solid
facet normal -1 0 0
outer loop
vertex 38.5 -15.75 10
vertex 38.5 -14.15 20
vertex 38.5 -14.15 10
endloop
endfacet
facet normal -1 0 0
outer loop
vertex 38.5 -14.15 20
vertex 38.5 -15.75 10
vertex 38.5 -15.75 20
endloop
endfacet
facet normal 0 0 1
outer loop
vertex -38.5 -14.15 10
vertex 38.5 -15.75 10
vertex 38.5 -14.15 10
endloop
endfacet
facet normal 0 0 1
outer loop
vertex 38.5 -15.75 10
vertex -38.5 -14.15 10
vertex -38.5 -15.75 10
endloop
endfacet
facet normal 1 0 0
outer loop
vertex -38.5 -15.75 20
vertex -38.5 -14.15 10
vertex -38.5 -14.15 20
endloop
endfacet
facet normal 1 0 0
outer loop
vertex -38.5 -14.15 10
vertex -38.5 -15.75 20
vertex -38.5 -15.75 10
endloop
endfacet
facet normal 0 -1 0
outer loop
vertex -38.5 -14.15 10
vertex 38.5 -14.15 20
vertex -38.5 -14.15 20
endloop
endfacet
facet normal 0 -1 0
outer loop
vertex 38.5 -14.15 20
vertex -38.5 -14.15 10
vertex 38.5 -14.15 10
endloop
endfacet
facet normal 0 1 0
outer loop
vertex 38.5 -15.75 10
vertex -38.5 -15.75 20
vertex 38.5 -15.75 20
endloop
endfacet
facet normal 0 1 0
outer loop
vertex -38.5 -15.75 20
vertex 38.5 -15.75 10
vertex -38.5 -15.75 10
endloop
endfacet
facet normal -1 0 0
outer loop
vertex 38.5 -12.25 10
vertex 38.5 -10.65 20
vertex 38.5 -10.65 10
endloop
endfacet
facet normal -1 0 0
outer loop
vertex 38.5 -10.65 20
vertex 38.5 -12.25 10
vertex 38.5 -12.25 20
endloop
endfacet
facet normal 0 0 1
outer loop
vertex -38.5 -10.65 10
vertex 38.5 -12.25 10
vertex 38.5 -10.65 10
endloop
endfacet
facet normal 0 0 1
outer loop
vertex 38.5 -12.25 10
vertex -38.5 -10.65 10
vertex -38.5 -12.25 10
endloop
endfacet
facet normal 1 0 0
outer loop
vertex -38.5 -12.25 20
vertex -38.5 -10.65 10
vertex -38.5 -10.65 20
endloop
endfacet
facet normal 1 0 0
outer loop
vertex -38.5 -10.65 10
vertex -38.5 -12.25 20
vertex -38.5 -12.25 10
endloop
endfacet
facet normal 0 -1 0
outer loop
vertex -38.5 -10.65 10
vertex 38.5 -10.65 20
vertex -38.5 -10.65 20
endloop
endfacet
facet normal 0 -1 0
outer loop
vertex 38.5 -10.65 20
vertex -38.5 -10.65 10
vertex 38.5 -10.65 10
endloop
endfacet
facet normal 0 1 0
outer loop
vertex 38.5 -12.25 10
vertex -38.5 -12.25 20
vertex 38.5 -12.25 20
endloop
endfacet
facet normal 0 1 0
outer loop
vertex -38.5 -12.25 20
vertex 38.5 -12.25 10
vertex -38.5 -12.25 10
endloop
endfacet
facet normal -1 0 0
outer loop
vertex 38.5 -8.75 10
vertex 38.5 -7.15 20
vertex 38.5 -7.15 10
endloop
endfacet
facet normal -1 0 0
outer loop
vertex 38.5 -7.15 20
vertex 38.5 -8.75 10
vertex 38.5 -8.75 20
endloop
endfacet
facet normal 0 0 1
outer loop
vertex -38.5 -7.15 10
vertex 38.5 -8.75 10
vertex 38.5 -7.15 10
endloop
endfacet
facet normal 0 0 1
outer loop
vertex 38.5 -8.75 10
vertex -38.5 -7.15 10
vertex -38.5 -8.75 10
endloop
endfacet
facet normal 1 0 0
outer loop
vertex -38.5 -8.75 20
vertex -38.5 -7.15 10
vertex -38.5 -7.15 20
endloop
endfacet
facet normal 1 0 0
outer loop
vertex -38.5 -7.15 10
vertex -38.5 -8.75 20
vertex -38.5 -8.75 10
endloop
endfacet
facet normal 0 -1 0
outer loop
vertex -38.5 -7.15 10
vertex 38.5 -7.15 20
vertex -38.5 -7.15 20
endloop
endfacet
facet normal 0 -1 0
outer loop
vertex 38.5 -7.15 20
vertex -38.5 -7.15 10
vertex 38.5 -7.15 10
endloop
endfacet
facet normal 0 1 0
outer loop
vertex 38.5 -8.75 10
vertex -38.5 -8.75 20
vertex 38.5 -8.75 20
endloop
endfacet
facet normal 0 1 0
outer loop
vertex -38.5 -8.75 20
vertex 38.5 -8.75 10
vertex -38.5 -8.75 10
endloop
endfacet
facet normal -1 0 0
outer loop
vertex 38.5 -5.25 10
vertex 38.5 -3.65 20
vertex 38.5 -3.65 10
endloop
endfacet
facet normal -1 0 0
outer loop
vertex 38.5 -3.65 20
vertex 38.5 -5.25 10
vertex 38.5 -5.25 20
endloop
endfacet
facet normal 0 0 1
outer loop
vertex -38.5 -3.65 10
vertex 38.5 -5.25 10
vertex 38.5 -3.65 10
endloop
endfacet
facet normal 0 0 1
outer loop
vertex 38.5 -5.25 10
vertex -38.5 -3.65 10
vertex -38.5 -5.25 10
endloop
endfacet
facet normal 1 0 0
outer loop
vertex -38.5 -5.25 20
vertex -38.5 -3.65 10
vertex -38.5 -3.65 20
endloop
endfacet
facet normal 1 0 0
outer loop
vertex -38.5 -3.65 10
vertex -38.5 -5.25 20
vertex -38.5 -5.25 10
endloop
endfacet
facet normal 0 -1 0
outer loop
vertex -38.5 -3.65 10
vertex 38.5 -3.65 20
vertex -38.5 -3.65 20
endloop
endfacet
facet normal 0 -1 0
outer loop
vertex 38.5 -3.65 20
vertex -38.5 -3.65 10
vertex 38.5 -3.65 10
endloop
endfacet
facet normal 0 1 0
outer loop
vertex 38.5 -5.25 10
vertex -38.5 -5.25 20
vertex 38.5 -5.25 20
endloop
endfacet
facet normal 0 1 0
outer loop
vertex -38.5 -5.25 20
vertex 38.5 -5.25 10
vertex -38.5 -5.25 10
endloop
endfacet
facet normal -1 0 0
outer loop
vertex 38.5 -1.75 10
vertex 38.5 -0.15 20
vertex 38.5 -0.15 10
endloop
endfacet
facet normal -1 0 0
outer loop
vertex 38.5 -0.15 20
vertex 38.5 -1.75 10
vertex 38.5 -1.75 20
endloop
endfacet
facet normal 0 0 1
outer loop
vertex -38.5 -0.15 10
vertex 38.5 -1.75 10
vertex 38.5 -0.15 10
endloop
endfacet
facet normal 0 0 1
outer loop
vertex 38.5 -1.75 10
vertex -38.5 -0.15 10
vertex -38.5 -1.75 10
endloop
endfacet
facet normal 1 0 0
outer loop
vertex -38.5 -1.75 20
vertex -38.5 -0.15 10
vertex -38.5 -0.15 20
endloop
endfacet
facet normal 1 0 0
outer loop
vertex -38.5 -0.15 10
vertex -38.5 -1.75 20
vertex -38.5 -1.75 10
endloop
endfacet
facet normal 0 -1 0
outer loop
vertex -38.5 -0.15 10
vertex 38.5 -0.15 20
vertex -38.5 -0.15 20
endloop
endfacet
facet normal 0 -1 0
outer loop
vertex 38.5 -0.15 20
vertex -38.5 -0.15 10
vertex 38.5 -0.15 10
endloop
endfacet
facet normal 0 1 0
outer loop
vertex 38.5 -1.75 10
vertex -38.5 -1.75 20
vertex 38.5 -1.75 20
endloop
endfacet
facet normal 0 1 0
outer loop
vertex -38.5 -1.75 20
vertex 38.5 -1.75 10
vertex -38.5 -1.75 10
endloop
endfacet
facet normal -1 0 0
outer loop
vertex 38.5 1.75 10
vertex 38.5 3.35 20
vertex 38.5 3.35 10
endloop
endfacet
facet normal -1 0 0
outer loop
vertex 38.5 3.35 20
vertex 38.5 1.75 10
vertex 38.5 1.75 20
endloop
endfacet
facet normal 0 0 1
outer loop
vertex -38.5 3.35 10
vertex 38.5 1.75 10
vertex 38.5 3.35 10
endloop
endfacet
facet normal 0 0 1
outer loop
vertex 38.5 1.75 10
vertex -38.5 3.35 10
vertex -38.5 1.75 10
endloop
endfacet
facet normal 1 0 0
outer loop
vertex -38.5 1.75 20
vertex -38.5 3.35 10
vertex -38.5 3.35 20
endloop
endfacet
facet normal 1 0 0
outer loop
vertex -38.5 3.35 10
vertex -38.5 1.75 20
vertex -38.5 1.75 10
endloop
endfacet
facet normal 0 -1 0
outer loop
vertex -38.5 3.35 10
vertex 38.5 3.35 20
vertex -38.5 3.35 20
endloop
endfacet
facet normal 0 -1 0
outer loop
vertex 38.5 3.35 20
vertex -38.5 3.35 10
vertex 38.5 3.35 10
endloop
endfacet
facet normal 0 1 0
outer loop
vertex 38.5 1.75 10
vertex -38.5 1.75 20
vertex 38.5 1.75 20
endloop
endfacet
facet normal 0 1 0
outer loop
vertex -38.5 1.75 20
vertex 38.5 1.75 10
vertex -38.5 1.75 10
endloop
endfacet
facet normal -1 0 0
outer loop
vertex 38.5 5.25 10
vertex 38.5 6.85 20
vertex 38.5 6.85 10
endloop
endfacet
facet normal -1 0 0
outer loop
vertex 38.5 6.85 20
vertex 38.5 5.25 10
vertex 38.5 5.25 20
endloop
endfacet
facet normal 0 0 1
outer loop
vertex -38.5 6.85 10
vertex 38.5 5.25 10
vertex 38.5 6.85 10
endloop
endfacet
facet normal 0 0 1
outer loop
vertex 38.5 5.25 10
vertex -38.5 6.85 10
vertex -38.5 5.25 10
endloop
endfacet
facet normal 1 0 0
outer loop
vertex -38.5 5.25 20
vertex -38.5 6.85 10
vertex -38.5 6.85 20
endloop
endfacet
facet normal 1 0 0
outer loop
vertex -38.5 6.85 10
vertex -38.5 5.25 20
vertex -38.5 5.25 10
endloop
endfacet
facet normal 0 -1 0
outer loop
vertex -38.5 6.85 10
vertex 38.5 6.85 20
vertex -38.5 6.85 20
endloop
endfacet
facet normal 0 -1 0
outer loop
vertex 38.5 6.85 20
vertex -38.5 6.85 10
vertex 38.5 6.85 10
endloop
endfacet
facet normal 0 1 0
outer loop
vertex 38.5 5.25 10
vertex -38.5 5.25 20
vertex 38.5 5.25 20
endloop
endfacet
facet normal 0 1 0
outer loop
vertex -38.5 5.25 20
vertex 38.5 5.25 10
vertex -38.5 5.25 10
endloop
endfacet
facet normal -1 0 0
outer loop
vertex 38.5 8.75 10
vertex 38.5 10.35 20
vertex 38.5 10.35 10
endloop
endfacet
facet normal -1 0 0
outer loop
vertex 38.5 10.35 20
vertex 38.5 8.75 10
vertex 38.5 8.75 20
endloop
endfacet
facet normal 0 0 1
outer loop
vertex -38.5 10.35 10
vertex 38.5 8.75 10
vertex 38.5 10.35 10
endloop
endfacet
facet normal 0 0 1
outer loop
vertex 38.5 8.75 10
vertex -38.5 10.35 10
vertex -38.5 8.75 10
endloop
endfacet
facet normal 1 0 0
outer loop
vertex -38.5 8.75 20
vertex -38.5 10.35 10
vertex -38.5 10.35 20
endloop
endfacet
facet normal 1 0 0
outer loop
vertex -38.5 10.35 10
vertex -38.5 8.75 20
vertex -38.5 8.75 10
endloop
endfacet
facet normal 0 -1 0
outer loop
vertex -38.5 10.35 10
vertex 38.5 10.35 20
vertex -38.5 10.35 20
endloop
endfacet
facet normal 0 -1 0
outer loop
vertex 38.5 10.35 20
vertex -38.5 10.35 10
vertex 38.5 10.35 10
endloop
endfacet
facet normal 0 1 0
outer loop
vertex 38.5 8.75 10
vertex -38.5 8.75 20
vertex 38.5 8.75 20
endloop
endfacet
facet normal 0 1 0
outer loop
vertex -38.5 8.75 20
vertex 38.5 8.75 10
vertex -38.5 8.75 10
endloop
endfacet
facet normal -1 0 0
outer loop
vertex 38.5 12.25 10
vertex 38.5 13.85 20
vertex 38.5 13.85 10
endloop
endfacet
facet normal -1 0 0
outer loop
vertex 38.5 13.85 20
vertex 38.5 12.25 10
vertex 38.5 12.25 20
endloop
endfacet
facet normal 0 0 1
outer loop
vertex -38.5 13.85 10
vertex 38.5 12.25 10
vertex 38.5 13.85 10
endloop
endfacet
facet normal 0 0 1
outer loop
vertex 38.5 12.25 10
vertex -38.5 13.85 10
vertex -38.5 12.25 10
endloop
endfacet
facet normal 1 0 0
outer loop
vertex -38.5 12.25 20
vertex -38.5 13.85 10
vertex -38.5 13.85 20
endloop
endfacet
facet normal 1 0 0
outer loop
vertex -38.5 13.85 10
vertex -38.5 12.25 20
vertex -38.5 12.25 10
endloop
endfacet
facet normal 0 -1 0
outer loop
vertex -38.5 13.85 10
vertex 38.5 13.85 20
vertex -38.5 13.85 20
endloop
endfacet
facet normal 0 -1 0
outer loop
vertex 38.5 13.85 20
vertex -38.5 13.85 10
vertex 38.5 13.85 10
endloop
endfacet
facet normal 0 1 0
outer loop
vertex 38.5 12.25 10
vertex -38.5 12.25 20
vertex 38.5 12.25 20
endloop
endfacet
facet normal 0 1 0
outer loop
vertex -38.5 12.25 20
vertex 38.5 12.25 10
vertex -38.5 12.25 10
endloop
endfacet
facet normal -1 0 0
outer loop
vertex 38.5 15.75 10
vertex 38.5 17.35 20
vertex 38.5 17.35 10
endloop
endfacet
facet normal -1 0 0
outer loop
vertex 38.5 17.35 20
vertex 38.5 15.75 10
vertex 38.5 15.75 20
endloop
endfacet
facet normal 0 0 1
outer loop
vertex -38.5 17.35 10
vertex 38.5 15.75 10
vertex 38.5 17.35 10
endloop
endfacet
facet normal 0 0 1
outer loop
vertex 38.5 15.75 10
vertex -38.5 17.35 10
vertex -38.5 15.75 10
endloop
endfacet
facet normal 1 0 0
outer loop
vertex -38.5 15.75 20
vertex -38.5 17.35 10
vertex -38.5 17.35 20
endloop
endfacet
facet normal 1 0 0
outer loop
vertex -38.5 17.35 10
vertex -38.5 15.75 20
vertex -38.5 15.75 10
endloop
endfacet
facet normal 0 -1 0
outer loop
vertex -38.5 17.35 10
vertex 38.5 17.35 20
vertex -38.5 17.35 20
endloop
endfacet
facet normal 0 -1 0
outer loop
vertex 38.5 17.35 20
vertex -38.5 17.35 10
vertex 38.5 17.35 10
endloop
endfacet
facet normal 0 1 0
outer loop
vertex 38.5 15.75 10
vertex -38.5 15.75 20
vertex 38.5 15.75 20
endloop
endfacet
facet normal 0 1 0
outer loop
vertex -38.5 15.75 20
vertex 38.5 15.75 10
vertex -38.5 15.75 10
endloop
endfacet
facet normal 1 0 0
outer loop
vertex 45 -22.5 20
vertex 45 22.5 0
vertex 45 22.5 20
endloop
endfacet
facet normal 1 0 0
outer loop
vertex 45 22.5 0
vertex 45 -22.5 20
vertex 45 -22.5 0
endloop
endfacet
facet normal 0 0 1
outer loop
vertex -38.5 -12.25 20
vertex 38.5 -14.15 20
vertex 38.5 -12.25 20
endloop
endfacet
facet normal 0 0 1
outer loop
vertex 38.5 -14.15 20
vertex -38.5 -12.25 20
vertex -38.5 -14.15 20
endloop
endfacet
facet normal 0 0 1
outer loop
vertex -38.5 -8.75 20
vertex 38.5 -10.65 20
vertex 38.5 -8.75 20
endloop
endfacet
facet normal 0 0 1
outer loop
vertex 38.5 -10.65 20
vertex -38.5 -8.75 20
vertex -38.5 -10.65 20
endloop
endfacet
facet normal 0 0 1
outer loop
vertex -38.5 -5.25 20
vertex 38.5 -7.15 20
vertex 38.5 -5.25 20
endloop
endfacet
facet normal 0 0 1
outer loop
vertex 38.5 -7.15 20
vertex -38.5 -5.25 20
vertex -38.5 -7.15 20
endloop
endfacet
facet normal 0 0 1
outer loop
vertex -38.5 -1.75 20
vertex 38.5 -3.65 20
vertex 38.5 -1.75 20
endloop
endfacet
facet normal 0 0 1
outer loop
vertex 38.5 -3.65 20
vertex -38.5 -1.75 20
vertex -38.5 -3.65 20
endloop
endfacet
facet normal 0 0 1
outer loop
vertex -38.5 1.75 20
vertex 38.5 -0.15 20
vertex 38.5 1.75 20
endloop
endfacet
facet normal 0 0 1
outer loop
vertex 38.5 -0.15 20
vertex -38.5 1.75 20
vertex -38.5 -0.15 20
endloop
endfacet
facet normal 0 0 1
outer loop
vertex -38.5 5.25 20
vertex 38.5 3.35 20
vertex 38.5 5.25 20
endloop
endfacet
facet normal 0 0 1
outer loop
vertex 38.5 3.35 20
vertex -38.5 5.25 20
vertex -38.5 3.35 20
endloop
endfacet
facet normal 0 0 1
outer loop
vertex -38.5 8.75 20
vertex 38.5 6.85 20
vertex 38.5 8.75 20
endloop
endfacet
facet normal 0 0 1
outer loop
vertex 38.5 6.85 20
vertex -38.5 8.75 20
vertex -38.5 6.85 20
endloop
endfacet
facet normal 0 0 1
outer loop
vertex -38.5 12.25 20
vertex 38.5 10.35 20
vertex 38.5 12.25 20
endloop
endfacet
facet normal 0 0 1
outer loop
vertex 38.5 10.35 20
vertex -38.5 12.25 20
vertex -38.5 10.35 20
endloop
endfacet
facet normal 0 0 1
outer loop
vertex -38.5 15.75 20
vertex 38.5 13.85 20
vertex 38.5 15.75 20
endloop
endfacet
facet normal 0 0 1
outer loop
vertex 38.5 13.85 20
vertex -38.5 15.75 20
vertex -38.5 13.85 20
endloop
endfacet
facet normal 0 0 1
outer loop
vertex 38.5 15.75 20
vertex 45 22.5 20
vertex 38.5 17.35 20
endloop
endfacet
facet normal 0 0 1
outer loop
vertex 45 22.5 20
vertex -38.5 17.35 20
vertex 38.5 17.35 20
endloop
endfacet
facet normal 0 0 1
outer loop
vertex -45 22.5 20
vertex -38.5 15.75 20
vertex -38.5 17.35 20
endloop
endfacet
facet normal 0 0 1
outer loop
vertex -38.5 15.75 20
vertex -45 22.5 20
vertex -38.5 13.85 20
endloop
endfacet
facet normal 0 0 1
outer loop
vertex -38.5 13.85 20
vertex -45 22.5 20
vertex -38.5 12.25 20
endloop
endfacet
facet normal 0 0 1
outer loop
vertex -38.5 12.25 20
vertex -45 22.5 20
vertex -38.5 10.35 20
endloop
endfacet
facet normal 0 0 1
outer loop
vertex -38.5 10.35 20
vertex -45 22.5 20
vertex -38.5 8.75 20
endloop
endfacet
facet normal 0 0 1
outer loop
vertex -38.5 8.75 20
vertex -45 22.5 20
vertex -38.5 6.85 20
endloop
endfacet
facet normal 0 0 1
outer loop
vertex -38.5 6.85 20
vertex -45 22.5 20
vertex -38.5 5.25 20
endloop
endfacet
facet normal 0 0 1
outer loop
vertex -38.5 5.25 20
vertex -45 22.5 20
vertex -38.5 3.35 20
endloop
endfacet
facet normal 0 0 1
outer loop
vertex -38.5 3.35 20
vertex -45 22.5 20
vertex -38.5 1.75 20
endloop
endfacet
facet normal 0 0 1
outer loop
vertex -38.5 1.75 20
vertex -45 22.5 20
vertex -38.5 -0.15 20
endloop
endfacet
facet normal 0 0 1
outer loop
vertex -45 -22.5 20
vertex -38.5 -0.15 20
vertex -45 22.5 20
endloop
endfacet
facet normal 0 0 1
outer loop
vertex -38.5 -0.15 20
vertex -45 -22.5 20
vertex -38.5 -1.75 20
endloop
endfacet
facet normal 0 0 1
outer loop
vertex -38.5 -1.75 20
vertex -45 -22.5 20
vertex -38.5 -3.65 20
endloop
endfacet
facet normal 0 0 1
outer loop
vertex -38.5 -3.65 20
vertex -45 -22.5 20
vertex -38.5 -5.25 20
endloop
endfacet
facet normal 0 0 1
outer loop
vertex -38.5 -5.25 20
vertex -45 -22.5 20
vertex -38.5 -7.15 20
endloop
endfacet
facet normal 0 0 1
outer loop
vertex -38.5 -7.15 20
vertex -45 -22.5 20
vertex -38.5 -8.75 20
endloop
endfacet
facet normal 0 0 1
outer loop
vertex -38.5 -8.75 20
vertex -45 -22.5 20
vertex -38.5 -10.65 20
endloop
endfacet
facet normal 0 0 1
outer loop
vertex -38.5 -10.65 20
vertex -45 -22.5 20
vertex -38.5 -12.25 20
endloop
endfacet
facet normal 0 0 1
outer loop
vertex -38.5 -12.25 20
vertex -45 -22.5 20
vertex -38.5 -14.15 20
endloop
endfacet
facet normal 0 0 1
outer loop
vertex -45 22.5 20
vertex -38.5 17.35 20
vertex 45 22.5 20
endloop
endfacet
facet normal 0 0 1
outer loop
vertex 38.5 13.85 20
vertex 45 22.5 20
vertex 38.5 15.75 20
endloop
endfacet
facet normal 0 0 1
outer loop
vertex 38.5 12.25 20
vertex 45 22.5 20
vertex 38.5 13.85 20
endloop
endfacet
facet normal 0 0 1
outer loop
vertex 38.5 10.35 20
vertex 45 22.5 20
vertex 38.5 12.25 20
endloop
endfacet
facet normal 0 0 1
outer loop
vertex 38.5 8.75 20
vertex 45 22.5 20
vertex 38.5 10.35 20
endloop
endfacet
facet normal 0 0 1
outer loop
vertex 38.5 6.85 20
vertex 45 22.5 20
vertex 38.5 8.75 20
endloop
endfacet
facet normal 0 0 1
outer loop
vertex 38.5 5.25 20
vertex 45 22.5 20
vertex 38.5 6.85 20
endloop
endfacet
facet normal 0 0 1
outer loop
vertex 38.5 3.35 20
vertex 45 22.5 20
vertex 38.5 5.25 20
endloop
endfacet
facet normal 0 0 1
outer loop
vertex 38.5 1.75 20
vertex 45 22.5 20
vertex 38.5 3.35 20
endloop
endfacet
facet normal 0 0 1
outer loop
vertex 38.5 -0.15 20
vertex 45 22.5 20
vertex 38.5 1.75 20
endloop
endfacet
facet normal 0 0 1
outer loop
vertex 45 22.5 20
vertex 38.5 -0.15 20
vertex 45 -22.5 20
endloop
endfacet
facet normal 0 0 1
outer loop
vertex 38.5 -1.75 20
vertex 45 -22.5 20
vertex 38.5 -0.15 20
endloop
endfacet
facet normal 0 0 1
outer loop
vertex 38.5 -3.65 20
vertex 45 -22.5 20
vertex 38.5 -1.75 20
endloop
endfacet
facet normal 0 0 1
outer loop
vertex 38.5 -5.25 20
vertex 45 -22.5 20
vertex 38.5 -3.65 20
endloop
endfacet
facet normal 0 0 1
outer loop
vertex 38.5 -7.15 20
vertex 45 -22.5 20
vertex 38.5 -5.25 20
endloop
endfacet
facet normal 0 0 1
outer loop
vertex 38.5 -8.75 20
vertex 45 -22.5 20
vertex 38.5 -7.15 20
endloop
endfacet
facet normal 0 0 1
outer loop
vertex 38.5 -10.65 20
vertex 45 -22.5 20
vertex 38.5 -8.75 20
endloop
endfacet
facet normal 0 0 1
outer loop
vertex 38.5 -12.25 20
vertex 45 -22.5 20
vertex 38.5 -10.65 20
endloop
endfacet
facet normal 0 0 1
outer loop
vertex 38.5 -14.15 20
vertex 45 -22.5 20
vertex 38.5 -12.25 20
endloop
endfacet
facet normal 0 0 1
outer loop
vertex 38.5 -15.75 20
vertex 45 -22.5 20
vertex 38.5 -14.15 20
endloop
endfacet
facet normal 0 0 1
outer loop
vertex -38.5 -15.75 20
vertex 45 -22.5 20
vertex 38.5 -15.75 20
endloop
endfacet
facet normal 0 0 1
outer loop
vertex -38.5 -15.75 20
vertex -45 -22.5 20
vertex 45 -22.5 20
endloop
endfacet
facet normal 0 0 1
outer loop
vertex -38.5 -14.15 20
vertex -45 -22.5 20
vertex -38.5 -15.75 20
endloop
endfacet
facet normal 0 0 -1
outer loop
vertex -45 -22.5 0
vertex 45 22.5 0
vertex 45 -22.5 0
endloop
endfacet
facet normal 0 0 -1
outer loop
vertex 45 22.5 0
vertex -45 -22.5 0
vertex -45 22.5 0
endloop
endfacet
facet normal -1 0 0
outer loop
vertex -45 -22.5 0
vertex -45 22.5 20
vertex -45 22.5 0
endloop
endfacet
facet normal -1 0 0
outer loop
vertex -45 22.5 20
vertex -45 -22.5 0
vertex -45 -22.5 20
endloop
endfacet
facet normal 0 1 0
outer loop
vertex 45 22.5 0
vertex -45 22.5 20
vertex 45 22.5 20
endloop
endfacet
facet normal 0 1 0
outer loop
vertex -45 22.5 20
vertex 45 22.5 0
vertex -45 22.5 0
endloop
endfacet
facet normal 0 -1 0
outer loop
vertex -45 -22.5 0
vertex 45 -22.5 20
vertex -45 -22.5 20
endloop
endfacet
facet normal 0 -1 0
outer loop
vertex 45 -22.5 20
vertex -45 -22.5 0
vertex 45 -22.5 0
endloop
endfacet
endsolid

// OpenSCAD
// Sliding rack for 10 microscope slides (75 x 25 x 1 mm)
// Print orientation: base block on XY plane, slots open upward (+Z)

// ---------------- Parameters ----------------
n_slots      = 10;    // number of slide slots
slot_len     = 77;    // slot length along X (mm)
slot_w       = 1.6;   // slot width along Y (mm)
slot_depth   = 10;    // slot depth from top face (mm)
slot_pitch   = 3.5;   // centre-to-centre spacing along Y (mm)
block_len    = 90;    // base block length along X (mm)
block_w      = 45;    // base block width along Y (mm)
block_h      = 20;    // base block height along Z (mm)
eps          = 0.5;   // overcut past faces to avoid coplanar faces (mm)

$fn = 64;

// ---------------- Model ----------------
difference() {
    // Base block, centred in X and Y, resting on z = 0
    translate([-block_len / 2, -block_w / 2, 0])
        cube([block_len, block_w, block_h]);

    // Slot group centred on the block in X and Y
    for (i = [0 : n_slots - 1]) {
        y = (i - (n_slots - 1) / 2) * slot_pitch;
        translate([-slot_len / 2, y, block_h - slot_depth])
            cube([slot_len, slot_w, slot_depth + eps]);
    }
}
